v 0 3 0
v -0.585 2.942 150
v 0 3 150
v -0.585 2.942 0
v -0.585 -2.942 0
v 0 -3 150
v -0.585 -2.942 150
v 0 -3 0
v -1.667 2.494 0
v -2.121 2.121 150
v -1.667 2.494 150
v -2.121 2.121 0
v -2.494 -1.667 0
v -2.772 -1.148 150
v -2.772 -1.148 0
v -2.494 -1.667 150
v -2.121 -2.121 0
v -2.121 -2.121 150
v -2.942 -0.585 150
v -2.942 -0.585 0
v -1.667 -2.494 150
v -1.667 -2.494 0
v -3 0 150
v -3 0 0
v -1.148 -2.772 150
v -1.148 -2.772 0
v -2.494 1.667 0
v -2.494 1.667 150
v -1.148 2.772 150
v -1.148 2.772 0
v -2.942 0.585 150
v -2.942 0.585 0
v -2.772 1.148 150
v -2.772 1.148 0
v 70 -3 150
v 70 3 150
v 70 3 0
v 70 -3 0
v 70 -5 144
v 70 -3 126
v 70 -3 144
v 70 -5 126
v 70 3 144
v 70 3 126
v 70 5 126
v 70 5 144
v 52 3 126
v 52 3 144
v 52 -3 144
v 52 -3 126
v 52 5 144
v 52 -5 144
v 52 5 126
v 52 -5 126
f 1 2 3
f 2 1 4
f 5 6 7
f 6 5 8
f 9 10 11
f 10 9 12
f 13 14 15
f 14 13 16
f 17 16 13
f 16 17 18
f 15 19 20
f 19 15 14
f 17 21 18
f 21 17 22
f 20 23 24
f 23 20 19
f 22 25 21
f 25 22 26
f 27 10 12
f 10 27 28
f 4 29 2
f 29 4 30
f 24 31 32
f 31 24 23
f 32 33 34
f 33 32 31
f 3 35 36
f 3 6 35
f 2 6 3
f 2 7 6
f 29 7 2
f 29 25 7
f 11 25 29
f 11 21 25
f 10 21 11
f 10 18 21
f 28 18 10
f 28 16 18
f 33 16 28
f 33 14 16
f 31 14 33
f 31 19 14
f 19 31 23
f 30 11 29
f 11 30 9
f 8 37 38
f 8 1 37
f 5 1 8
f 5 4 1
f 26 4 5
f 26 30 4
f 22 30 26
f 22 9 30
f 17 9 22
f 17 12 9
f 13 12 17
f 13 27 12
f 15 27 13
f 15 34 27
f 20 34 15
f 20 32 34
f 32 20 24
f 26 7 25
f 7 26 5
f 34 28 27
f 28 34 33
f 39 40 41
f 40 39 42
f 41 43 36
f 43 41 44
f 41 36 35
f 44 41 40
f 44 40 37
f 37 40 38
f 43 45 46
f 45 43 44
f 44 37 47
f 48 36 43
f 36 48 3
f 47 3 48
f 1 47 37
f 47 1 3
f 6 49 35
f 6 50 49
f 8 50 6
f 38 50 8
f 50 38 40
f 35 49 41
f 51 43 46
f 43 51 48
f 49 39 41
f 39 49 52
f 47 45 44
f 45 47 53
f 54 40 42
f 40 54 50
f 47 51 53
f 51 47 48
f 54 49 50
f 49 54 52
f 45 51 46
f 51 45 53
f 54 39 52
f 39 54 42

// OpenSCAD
door_width=70; door_height=150; door_thickness=6; hinge_pin_diameter=6; hinge_offset=5;
module saloon_door(){ union(){ cylinder(d=hinge_pin_diameter,h=door_height,$fn=32); translate([0,-door_thickness/2,0]) cube([door_width,door_thickness,door_height]); translate([door_width-18,-door_thickness/2-2,door_height-24]) cube([18,door_thickness+4,18]); }}
assert(door_width==70 && door_height==150 && hinge_pin_diameter==6); echo("SCADCTL_REQUIREMENT:parameters:PASS"); saloon_door();
